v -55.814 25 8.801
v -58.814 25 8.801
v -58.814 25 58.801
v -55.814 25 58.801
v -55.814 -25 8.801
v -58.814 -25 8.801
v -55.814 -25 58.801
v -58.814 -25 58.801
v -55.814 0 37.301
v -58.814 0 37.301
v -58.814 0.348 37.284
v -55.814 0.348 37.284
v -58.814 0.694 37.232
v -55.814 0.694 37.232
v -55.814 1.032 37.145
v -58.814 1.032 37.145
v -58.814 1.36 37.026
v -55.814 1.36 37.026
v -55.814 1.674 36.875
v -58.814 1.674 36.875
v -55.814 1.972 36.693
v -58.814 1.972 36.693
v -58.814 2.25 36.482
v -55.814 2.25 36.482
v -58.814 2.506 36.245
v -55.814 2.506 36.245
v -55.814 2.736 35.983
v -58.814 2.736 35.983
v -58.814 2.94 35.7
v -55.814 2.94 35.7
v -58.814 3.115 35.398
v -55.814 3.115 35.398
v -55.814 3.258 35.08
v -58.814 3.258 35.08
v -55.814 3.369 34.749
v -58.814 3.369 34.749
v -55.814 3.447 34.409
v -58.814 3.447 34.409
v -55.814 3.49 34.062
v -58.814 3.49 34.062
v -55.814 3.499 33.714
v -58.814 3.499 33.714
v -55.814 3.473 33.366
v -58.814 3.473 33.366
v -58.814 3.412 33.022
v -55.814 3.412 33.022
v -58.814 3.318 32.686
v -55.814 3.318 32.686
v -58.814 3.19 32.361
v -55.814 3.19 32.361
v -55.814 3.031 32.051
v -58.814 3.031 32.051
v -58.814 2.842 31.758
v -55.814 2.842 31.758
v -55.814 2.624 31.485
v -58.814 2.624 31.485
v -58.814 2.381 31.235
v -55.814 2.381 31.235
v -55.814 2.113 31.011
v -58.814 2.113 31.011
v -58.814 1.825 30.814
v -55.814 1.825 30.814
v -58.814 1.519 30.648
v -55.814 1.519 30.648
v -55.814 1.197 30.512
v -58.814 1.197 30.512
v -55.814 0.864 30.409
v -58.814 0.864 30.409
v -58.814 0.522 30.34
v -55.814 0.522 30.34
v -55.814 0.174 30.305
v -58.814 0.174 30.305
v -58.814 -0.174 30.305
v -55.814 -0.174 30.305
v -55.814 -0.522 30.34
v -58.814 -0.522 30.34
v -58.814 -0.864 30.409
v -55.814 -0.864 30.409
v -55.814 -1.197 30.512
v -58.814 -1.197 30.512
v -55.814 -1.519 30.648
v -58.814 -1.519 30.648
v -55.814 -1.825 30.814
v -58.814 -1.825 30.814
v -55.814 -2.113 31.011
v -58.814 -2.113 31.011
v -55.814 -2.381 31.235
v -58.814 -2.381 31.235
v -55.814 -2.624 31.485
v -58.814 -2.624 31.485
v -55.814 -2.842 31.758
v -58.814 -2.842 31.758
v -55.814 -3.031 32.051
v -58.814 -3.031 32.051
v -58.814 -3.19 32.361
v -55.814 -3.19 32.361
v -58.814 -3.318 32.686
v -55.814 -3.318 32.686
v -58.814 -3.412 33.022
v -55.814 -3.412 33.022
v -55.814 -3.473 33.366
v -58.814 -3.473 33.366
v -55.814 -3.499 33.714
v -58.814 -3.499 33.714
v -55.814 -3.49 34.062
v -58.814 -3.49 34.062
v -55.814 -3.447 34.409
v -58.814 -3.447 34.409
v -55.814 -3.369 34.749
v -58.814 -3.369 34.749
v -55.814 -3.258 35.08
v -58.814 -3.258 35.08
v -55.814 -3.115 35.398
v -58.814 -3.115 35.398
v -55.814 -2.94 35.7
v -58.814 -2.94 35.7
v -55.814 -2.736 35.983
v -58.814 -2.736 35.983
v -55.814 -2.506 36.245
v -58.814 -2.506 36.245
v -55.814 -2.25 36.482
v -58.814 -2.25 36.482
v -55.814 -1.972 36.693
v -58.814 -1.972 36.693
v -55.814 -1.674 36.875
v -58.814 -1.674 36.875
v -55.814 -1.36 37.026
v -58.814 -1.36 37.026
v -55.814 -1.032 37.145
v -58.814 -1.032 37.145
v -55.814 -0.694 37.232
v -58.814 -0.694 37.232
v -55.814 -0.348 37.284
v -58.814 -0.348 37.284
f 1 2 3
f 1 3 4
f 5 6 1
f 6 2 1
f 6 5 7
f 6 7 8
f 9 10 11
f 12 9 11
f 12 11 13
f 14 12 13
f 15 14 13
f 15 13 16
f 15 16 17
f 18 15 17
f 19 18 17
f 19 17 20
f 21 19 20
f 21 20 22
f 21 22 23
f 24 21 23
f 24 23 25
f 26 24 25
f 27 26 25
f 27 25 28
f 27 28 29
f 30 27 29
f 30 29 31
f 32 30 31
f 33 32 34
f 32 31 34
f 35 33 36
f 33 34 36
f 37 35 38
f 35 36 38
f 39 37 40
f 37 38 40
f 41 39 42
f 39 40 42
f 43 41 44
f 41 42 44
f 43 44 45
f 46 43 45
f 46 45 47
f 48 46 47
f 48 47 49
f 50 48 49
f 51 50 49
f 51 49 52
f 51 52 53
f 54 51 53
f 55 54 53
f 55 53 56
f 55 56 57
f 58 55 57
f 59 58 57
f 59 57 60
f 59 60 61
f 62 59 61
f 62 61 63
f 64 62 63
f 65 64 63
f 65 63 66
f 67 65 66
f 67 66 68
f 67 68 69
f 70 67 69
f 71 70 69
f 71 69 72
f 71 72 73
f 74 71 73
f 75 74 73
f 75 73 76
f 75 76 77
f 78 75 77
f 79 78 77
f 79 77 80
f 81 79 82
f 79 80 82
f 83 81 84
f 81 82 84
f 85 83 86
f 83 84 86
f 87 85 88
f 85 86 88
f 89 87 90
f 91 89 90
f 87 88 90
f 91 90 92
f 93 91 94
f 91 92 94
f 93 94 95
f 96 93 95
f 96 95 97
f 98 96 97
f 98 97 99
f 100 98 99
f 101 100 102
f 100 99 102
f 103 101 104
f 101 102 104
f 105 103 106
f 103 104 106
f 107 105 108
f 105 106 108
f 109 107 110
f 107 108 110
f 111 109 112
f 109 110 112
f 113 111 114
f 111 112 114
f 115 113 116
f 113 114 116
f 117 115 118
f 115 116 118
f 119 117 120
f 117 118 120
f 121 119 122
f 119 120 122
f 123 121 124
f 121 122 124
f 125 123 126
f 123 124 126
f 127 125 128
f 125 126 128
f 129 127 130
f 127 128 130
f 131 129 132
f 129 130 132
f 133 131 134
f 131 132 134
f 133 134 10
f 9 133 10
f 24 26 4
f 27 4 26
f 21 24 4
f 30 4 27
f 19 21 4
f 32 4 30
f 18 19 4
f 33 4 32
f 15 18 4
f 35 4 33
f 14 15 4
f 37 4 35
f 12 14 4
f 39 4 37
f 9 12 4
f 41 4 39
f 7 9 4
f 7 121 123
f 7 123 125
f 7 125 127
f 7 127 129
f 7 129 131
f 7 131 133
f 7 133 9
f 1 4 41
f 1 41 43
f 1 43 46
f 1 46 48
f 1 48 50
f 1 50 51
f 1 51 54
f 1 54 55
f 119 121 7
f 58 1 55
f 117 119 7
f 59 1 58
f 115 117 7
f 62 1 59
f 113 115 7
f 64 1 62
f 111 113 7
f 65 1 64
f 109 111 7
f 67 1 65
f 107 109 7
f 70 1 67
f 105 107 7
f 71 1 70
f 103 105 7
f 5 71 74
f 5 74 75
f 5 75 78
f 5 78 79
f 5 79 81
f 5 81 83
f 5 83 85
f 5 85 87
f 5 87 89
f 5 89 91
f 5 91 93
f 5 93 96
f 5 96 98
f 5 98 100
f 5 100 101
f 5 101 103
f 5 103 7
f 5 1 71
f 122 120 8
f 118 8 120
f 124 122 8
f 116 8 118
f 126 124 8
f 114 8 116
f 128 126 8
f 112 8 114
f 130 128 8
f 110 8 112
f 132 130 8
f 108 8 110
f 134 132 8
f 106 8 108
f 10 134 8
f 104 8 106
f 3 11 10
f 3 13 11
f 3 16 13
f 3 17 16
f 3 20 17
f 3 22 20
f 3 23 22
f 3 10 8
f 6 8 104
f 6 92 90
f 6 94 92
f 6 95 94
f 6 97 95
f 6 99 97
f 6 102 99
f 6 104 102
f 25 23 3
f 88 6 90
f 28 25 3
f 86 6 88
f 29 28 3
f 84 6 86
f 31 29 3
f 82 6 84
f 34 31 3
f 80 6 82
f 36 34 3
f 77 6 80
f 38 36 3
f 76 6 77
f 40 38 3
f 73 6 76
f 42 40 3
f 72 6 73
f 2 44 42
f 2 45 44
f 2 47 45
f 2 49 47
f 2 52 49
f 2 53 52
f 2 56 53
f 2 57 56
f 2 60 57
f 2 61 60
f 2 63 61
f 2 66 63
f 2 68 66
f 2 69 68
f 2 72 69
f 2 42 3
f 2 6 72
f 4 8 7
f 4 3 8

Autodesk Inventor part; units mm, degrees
ref_plane "YZ Plane" through (0, 0, 0) normal (1, 0, 0) x (0, 1, 0)
ref_plane "XZ Plane" through (0, 0, 0) normal (0, 1, 0) x (-1, 0, 0)
ref_plane "XY Plane" through (0, 0, 0) normal (0, 0, 1) x (1, 0, 0)
ref_plane "Work Plane1" through (-10.1425, 21.3894, 8.8009) normal (0, 0, 1) x (1, 0, 0)
sketch "Sketch1" plane through (-10.1425, 21.3894, 8.8009) normal (0, 0, 1) x (1, 0, 0)
  line L0 (-48.6717, 3.6106) -> (201.3283, 3.6106) projected
  line L1 (-48.6717, -46.3894) -> (-48.6717, 3.6106) projected
  line L2 (201.3283, -46.3894) -> (-48.6717, -46.3894) projected
  line L3 (201.3283, 3.6106) -> (201.3283, -46.3894) projected
  circle A0 centre (172.519, -38.8894) radius 1.5 projected
  circle A1 centre (172.519, -3.8894) radius 1.5 projected
  circle A2 centre (195.2663, -38.8894) radius 1.5 projected
  circle A3 centre (195.2663, -3.8894) radius 1.5 projected
  line L4 (-48.6717, 3.6106) -> (-45.6717, 3.6106)
  line L5 (-45.6717, 3.6106) -> (-45.6717, -46.3894)
  line L6 (-45.6717, -46.3894) -> (-48.6717, -46.3894)
  line L7 (-48.6717, -46.3894) -> (-48.6717, 3.6106)
  point P0 (10.1425, -21.3894)
  point P1 (-45.6717, 3.6106)
  dimension "d0" = 3
extrude "Extrusion1" add sketch "Sketch1" along normal blind 50 contours L0 L5 L2 L1
sketch "Sketch2" plane through (-58.8142, -25, 8.8009) normal (-1, 0, 0) x (0, 0, 1)
  line L0 (0, 50) -> (0, 0) projected
  line L1 (0, 0) -> (50, 0) projected
  line L2 (50, 50) -> (50, 0) projected
  line L3 (0, 50) -> (50, 50) projected
  circle A0 centre (25, 25) radius 3.5
  point P0 (-8.8009, 25)
  dimension "d3" = 7
extrude "Extrusion2" cut sketch "Sketch2" against normal through all contours A0
properties part number "arm2" material "Polycarbonate, Clear"
